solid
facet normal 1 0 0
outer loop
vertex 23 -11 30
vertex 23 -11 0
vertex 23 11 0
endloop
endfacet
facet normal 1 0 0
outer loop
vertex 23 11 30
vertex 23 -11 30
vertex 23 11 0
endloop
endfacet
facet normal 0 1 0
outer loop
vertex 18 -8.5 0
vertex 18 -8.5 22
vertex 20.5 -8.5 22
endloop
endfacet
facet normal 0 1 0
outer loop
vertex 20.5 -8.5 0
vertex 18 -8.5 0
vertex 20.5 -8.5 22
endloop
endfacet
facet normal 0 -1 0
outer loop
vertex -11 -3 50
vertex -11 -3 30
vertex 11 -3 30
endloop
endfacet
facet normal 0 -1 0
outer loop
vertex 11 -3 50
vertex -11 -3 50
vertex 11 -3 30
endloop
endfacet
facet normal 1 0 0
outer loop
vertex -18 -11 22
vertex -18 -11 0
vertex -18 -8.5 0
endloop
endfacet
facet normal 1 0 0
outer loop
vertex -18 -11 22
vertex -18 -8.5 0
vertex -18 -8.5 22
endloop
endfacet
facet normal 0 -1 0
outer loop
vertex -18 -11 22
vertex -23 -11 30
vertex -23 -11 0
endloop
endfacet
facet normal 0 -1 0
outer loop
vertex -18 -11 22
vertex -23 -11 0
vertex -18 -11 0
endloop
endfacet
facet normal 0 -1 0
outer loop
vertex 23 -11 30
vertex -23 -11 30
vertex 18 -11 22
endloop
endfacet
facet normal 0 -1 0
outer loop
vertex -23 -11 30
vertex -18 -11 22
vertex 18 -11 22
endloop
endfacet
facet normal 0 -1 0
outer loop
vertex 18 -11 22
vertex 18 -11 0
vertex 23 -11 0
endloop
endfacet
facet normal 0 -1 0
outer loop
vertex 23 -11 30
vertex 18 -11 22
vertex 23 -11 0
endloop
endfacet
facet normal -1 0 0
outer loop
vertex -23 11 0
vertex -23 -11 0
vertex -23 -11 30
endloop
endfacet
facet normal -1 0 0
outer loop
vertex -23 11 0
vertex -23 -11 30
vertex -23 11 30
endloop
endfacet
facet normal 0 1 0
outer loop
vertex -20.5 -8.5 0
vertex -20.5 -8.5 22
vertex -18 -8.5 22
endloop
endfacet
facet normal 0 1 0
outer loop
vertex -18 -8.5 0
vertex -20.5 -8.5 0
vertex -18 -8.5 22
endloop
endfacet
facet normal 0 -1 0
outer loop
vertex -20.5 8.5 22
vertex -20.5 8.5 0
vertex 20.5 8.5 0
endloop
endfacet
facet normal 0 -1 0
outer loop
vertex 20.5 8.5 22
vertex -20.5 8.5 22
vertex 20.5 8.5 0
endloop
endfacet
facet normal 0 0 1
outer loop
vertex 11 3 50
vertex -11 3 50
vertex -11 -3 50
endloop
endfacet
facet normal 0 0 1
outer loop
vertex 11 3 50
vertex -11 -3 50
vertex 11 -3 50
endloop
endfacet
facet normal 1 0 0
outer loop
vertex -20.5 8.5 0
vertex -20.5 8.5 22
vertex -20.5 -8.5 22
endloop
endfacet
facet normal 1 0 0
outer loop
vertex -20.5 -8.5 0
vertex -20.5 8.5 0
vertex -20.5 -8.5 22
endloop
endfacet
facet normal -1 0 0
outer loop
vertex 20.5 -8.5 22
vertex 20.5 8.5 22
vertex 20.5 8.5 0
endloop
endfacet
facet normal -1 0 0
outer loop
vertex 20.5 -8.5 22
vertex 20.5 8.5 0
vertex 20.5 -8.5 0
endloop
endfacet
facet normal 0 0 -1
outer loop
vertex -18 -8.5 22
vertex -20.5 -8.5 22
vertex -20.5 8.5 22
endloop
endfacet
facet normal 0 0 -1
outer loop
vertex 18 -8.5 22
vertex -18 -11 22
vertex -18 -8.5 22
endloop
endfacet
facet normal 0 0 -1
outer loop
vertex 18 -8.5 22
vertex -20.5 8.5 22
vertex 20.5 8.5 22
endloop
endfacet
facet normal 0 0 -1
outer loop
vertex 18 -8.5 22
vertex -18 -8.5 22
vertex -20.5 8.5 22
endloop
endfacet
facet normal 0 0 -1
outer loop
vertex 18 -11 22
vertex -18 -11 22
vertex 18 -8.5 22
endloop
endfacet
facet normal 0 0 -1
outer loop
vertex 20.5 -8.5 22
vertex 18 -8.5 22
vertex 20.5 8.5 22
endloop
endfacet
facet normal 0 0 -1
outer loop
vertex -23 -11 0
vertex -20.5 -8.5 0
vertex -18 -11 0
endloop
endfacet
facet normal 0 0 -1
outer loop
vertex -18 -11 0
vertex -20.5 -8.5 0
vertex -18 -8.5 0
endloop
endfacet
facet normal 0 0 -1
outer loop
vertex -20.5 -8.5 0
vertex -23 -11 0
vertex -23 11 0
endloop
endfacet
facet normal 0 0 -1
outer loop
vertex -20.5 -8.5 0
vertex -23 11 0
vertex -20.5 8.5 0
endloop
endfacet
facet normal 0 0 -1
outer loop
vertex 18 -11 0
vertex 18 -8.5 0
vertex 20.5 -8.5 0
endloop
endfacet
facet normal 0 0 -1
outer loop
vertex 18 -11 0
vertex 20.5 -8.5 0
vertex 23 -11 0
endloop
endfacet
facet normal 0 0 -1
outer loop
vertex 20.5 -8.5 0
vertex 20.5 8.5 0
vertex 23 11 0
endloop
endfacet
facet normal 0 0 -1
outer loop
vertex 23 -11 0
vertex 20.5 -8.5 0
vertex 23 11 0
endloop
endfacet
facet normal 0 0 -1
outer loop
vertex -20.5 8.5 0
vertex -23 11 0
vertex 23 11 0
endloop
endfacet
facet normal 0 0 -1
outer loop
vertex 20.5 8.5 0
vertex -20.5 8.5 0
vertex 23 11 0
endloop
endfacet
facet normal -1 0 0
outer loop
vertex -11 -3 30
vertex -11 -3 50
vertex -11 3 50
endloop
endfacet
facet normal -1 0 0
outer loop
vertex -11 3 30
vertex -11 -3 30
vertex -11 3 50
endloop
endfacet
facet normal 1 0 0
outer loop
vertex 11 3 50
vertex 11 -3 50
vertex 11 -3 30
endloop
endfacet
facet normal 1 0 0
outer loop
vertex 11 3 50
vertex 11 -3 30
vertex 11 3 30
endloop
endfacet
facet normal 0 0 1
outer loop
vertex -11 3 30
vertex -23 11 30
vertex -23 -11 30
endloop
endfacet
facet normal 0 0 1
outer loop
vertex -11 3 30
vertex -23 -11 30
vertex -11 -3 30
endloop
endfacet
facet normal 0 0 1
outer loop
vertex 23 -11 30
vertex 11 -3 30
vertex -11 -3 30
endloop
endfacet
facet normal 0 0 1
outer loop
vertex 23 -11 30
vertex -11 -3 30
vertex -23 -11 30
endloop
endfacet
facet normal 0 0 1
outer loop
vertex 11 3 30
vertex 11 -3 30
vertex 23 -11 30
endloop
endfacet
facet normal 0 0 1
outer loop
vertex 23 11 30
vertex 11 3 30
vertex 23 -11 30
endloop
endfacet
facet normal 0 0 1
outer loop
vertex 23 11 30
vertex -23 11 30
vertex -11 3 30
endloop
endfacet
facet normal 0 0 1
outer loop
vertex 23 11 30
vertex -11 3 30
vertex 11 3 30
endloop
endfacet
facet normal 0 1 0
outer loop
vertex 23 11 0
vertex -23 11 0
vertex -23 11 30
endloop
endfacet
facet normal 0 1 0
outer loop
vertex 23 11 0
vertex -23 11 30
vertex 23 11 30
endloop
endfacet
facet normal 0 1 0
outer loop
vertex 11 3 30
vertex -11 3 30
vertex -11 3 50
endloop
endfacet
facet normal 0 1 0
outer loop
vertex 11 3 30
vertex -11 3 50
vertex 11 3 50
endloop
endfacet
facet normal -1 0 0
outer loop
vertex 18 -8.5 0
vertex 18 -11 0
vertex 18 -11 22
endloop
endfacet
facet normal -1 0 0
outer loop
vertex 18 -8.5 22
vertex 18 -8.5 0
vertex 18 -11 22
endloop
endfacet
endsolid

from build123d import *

# Parameters (mm, degrees)
F0_W     = 46
F0_H     = 22
F1_DEPTH = 30
F2_W     = 41
F2_H     = 17
F3_DEPTH = 22
F4_W     = 36
F4_H     = 22
F5_DEPTH = 4
F6_W     = 22
F6_H     = 6
F7_DEPTH = 20


with BuildPart() as f1:
    # F0 (on Top) → F1 (new body)
    with BuildSketch(Plane.XY):
        Rectangle(F0_W, F0_H)
    extrude(amount=F1_DEPTH)

    # F2 (on face) → F3 (cut)
    with BuildSketch(Plane(origin=(0, 0, 0), x_dir=(1, 0, 0), z_dir=(0, 0, -1))):
        Rectangle(F2_W, F2_H)
    extrude(amount=-F3_DEPTH, mode=Mode.SUBTRACT)

    # F4 (on face) → F5 (cut)
    with BuildSketch(Plane.XZ.offset(11)):
        with Locations((0, 11)):
            Rectangle(F4_W, F4_H)
    extrude(amount=-F5_DEPTH, mode=Mode.SUBTRACT)

    # F6 (on face) → F7 (join)
    with BuildSketch(Plane.XY.offset(30)):
        Rectangle(F6_W, F6_H)
    extrude(amount=F7_DEPTH)


solid = f1.part
